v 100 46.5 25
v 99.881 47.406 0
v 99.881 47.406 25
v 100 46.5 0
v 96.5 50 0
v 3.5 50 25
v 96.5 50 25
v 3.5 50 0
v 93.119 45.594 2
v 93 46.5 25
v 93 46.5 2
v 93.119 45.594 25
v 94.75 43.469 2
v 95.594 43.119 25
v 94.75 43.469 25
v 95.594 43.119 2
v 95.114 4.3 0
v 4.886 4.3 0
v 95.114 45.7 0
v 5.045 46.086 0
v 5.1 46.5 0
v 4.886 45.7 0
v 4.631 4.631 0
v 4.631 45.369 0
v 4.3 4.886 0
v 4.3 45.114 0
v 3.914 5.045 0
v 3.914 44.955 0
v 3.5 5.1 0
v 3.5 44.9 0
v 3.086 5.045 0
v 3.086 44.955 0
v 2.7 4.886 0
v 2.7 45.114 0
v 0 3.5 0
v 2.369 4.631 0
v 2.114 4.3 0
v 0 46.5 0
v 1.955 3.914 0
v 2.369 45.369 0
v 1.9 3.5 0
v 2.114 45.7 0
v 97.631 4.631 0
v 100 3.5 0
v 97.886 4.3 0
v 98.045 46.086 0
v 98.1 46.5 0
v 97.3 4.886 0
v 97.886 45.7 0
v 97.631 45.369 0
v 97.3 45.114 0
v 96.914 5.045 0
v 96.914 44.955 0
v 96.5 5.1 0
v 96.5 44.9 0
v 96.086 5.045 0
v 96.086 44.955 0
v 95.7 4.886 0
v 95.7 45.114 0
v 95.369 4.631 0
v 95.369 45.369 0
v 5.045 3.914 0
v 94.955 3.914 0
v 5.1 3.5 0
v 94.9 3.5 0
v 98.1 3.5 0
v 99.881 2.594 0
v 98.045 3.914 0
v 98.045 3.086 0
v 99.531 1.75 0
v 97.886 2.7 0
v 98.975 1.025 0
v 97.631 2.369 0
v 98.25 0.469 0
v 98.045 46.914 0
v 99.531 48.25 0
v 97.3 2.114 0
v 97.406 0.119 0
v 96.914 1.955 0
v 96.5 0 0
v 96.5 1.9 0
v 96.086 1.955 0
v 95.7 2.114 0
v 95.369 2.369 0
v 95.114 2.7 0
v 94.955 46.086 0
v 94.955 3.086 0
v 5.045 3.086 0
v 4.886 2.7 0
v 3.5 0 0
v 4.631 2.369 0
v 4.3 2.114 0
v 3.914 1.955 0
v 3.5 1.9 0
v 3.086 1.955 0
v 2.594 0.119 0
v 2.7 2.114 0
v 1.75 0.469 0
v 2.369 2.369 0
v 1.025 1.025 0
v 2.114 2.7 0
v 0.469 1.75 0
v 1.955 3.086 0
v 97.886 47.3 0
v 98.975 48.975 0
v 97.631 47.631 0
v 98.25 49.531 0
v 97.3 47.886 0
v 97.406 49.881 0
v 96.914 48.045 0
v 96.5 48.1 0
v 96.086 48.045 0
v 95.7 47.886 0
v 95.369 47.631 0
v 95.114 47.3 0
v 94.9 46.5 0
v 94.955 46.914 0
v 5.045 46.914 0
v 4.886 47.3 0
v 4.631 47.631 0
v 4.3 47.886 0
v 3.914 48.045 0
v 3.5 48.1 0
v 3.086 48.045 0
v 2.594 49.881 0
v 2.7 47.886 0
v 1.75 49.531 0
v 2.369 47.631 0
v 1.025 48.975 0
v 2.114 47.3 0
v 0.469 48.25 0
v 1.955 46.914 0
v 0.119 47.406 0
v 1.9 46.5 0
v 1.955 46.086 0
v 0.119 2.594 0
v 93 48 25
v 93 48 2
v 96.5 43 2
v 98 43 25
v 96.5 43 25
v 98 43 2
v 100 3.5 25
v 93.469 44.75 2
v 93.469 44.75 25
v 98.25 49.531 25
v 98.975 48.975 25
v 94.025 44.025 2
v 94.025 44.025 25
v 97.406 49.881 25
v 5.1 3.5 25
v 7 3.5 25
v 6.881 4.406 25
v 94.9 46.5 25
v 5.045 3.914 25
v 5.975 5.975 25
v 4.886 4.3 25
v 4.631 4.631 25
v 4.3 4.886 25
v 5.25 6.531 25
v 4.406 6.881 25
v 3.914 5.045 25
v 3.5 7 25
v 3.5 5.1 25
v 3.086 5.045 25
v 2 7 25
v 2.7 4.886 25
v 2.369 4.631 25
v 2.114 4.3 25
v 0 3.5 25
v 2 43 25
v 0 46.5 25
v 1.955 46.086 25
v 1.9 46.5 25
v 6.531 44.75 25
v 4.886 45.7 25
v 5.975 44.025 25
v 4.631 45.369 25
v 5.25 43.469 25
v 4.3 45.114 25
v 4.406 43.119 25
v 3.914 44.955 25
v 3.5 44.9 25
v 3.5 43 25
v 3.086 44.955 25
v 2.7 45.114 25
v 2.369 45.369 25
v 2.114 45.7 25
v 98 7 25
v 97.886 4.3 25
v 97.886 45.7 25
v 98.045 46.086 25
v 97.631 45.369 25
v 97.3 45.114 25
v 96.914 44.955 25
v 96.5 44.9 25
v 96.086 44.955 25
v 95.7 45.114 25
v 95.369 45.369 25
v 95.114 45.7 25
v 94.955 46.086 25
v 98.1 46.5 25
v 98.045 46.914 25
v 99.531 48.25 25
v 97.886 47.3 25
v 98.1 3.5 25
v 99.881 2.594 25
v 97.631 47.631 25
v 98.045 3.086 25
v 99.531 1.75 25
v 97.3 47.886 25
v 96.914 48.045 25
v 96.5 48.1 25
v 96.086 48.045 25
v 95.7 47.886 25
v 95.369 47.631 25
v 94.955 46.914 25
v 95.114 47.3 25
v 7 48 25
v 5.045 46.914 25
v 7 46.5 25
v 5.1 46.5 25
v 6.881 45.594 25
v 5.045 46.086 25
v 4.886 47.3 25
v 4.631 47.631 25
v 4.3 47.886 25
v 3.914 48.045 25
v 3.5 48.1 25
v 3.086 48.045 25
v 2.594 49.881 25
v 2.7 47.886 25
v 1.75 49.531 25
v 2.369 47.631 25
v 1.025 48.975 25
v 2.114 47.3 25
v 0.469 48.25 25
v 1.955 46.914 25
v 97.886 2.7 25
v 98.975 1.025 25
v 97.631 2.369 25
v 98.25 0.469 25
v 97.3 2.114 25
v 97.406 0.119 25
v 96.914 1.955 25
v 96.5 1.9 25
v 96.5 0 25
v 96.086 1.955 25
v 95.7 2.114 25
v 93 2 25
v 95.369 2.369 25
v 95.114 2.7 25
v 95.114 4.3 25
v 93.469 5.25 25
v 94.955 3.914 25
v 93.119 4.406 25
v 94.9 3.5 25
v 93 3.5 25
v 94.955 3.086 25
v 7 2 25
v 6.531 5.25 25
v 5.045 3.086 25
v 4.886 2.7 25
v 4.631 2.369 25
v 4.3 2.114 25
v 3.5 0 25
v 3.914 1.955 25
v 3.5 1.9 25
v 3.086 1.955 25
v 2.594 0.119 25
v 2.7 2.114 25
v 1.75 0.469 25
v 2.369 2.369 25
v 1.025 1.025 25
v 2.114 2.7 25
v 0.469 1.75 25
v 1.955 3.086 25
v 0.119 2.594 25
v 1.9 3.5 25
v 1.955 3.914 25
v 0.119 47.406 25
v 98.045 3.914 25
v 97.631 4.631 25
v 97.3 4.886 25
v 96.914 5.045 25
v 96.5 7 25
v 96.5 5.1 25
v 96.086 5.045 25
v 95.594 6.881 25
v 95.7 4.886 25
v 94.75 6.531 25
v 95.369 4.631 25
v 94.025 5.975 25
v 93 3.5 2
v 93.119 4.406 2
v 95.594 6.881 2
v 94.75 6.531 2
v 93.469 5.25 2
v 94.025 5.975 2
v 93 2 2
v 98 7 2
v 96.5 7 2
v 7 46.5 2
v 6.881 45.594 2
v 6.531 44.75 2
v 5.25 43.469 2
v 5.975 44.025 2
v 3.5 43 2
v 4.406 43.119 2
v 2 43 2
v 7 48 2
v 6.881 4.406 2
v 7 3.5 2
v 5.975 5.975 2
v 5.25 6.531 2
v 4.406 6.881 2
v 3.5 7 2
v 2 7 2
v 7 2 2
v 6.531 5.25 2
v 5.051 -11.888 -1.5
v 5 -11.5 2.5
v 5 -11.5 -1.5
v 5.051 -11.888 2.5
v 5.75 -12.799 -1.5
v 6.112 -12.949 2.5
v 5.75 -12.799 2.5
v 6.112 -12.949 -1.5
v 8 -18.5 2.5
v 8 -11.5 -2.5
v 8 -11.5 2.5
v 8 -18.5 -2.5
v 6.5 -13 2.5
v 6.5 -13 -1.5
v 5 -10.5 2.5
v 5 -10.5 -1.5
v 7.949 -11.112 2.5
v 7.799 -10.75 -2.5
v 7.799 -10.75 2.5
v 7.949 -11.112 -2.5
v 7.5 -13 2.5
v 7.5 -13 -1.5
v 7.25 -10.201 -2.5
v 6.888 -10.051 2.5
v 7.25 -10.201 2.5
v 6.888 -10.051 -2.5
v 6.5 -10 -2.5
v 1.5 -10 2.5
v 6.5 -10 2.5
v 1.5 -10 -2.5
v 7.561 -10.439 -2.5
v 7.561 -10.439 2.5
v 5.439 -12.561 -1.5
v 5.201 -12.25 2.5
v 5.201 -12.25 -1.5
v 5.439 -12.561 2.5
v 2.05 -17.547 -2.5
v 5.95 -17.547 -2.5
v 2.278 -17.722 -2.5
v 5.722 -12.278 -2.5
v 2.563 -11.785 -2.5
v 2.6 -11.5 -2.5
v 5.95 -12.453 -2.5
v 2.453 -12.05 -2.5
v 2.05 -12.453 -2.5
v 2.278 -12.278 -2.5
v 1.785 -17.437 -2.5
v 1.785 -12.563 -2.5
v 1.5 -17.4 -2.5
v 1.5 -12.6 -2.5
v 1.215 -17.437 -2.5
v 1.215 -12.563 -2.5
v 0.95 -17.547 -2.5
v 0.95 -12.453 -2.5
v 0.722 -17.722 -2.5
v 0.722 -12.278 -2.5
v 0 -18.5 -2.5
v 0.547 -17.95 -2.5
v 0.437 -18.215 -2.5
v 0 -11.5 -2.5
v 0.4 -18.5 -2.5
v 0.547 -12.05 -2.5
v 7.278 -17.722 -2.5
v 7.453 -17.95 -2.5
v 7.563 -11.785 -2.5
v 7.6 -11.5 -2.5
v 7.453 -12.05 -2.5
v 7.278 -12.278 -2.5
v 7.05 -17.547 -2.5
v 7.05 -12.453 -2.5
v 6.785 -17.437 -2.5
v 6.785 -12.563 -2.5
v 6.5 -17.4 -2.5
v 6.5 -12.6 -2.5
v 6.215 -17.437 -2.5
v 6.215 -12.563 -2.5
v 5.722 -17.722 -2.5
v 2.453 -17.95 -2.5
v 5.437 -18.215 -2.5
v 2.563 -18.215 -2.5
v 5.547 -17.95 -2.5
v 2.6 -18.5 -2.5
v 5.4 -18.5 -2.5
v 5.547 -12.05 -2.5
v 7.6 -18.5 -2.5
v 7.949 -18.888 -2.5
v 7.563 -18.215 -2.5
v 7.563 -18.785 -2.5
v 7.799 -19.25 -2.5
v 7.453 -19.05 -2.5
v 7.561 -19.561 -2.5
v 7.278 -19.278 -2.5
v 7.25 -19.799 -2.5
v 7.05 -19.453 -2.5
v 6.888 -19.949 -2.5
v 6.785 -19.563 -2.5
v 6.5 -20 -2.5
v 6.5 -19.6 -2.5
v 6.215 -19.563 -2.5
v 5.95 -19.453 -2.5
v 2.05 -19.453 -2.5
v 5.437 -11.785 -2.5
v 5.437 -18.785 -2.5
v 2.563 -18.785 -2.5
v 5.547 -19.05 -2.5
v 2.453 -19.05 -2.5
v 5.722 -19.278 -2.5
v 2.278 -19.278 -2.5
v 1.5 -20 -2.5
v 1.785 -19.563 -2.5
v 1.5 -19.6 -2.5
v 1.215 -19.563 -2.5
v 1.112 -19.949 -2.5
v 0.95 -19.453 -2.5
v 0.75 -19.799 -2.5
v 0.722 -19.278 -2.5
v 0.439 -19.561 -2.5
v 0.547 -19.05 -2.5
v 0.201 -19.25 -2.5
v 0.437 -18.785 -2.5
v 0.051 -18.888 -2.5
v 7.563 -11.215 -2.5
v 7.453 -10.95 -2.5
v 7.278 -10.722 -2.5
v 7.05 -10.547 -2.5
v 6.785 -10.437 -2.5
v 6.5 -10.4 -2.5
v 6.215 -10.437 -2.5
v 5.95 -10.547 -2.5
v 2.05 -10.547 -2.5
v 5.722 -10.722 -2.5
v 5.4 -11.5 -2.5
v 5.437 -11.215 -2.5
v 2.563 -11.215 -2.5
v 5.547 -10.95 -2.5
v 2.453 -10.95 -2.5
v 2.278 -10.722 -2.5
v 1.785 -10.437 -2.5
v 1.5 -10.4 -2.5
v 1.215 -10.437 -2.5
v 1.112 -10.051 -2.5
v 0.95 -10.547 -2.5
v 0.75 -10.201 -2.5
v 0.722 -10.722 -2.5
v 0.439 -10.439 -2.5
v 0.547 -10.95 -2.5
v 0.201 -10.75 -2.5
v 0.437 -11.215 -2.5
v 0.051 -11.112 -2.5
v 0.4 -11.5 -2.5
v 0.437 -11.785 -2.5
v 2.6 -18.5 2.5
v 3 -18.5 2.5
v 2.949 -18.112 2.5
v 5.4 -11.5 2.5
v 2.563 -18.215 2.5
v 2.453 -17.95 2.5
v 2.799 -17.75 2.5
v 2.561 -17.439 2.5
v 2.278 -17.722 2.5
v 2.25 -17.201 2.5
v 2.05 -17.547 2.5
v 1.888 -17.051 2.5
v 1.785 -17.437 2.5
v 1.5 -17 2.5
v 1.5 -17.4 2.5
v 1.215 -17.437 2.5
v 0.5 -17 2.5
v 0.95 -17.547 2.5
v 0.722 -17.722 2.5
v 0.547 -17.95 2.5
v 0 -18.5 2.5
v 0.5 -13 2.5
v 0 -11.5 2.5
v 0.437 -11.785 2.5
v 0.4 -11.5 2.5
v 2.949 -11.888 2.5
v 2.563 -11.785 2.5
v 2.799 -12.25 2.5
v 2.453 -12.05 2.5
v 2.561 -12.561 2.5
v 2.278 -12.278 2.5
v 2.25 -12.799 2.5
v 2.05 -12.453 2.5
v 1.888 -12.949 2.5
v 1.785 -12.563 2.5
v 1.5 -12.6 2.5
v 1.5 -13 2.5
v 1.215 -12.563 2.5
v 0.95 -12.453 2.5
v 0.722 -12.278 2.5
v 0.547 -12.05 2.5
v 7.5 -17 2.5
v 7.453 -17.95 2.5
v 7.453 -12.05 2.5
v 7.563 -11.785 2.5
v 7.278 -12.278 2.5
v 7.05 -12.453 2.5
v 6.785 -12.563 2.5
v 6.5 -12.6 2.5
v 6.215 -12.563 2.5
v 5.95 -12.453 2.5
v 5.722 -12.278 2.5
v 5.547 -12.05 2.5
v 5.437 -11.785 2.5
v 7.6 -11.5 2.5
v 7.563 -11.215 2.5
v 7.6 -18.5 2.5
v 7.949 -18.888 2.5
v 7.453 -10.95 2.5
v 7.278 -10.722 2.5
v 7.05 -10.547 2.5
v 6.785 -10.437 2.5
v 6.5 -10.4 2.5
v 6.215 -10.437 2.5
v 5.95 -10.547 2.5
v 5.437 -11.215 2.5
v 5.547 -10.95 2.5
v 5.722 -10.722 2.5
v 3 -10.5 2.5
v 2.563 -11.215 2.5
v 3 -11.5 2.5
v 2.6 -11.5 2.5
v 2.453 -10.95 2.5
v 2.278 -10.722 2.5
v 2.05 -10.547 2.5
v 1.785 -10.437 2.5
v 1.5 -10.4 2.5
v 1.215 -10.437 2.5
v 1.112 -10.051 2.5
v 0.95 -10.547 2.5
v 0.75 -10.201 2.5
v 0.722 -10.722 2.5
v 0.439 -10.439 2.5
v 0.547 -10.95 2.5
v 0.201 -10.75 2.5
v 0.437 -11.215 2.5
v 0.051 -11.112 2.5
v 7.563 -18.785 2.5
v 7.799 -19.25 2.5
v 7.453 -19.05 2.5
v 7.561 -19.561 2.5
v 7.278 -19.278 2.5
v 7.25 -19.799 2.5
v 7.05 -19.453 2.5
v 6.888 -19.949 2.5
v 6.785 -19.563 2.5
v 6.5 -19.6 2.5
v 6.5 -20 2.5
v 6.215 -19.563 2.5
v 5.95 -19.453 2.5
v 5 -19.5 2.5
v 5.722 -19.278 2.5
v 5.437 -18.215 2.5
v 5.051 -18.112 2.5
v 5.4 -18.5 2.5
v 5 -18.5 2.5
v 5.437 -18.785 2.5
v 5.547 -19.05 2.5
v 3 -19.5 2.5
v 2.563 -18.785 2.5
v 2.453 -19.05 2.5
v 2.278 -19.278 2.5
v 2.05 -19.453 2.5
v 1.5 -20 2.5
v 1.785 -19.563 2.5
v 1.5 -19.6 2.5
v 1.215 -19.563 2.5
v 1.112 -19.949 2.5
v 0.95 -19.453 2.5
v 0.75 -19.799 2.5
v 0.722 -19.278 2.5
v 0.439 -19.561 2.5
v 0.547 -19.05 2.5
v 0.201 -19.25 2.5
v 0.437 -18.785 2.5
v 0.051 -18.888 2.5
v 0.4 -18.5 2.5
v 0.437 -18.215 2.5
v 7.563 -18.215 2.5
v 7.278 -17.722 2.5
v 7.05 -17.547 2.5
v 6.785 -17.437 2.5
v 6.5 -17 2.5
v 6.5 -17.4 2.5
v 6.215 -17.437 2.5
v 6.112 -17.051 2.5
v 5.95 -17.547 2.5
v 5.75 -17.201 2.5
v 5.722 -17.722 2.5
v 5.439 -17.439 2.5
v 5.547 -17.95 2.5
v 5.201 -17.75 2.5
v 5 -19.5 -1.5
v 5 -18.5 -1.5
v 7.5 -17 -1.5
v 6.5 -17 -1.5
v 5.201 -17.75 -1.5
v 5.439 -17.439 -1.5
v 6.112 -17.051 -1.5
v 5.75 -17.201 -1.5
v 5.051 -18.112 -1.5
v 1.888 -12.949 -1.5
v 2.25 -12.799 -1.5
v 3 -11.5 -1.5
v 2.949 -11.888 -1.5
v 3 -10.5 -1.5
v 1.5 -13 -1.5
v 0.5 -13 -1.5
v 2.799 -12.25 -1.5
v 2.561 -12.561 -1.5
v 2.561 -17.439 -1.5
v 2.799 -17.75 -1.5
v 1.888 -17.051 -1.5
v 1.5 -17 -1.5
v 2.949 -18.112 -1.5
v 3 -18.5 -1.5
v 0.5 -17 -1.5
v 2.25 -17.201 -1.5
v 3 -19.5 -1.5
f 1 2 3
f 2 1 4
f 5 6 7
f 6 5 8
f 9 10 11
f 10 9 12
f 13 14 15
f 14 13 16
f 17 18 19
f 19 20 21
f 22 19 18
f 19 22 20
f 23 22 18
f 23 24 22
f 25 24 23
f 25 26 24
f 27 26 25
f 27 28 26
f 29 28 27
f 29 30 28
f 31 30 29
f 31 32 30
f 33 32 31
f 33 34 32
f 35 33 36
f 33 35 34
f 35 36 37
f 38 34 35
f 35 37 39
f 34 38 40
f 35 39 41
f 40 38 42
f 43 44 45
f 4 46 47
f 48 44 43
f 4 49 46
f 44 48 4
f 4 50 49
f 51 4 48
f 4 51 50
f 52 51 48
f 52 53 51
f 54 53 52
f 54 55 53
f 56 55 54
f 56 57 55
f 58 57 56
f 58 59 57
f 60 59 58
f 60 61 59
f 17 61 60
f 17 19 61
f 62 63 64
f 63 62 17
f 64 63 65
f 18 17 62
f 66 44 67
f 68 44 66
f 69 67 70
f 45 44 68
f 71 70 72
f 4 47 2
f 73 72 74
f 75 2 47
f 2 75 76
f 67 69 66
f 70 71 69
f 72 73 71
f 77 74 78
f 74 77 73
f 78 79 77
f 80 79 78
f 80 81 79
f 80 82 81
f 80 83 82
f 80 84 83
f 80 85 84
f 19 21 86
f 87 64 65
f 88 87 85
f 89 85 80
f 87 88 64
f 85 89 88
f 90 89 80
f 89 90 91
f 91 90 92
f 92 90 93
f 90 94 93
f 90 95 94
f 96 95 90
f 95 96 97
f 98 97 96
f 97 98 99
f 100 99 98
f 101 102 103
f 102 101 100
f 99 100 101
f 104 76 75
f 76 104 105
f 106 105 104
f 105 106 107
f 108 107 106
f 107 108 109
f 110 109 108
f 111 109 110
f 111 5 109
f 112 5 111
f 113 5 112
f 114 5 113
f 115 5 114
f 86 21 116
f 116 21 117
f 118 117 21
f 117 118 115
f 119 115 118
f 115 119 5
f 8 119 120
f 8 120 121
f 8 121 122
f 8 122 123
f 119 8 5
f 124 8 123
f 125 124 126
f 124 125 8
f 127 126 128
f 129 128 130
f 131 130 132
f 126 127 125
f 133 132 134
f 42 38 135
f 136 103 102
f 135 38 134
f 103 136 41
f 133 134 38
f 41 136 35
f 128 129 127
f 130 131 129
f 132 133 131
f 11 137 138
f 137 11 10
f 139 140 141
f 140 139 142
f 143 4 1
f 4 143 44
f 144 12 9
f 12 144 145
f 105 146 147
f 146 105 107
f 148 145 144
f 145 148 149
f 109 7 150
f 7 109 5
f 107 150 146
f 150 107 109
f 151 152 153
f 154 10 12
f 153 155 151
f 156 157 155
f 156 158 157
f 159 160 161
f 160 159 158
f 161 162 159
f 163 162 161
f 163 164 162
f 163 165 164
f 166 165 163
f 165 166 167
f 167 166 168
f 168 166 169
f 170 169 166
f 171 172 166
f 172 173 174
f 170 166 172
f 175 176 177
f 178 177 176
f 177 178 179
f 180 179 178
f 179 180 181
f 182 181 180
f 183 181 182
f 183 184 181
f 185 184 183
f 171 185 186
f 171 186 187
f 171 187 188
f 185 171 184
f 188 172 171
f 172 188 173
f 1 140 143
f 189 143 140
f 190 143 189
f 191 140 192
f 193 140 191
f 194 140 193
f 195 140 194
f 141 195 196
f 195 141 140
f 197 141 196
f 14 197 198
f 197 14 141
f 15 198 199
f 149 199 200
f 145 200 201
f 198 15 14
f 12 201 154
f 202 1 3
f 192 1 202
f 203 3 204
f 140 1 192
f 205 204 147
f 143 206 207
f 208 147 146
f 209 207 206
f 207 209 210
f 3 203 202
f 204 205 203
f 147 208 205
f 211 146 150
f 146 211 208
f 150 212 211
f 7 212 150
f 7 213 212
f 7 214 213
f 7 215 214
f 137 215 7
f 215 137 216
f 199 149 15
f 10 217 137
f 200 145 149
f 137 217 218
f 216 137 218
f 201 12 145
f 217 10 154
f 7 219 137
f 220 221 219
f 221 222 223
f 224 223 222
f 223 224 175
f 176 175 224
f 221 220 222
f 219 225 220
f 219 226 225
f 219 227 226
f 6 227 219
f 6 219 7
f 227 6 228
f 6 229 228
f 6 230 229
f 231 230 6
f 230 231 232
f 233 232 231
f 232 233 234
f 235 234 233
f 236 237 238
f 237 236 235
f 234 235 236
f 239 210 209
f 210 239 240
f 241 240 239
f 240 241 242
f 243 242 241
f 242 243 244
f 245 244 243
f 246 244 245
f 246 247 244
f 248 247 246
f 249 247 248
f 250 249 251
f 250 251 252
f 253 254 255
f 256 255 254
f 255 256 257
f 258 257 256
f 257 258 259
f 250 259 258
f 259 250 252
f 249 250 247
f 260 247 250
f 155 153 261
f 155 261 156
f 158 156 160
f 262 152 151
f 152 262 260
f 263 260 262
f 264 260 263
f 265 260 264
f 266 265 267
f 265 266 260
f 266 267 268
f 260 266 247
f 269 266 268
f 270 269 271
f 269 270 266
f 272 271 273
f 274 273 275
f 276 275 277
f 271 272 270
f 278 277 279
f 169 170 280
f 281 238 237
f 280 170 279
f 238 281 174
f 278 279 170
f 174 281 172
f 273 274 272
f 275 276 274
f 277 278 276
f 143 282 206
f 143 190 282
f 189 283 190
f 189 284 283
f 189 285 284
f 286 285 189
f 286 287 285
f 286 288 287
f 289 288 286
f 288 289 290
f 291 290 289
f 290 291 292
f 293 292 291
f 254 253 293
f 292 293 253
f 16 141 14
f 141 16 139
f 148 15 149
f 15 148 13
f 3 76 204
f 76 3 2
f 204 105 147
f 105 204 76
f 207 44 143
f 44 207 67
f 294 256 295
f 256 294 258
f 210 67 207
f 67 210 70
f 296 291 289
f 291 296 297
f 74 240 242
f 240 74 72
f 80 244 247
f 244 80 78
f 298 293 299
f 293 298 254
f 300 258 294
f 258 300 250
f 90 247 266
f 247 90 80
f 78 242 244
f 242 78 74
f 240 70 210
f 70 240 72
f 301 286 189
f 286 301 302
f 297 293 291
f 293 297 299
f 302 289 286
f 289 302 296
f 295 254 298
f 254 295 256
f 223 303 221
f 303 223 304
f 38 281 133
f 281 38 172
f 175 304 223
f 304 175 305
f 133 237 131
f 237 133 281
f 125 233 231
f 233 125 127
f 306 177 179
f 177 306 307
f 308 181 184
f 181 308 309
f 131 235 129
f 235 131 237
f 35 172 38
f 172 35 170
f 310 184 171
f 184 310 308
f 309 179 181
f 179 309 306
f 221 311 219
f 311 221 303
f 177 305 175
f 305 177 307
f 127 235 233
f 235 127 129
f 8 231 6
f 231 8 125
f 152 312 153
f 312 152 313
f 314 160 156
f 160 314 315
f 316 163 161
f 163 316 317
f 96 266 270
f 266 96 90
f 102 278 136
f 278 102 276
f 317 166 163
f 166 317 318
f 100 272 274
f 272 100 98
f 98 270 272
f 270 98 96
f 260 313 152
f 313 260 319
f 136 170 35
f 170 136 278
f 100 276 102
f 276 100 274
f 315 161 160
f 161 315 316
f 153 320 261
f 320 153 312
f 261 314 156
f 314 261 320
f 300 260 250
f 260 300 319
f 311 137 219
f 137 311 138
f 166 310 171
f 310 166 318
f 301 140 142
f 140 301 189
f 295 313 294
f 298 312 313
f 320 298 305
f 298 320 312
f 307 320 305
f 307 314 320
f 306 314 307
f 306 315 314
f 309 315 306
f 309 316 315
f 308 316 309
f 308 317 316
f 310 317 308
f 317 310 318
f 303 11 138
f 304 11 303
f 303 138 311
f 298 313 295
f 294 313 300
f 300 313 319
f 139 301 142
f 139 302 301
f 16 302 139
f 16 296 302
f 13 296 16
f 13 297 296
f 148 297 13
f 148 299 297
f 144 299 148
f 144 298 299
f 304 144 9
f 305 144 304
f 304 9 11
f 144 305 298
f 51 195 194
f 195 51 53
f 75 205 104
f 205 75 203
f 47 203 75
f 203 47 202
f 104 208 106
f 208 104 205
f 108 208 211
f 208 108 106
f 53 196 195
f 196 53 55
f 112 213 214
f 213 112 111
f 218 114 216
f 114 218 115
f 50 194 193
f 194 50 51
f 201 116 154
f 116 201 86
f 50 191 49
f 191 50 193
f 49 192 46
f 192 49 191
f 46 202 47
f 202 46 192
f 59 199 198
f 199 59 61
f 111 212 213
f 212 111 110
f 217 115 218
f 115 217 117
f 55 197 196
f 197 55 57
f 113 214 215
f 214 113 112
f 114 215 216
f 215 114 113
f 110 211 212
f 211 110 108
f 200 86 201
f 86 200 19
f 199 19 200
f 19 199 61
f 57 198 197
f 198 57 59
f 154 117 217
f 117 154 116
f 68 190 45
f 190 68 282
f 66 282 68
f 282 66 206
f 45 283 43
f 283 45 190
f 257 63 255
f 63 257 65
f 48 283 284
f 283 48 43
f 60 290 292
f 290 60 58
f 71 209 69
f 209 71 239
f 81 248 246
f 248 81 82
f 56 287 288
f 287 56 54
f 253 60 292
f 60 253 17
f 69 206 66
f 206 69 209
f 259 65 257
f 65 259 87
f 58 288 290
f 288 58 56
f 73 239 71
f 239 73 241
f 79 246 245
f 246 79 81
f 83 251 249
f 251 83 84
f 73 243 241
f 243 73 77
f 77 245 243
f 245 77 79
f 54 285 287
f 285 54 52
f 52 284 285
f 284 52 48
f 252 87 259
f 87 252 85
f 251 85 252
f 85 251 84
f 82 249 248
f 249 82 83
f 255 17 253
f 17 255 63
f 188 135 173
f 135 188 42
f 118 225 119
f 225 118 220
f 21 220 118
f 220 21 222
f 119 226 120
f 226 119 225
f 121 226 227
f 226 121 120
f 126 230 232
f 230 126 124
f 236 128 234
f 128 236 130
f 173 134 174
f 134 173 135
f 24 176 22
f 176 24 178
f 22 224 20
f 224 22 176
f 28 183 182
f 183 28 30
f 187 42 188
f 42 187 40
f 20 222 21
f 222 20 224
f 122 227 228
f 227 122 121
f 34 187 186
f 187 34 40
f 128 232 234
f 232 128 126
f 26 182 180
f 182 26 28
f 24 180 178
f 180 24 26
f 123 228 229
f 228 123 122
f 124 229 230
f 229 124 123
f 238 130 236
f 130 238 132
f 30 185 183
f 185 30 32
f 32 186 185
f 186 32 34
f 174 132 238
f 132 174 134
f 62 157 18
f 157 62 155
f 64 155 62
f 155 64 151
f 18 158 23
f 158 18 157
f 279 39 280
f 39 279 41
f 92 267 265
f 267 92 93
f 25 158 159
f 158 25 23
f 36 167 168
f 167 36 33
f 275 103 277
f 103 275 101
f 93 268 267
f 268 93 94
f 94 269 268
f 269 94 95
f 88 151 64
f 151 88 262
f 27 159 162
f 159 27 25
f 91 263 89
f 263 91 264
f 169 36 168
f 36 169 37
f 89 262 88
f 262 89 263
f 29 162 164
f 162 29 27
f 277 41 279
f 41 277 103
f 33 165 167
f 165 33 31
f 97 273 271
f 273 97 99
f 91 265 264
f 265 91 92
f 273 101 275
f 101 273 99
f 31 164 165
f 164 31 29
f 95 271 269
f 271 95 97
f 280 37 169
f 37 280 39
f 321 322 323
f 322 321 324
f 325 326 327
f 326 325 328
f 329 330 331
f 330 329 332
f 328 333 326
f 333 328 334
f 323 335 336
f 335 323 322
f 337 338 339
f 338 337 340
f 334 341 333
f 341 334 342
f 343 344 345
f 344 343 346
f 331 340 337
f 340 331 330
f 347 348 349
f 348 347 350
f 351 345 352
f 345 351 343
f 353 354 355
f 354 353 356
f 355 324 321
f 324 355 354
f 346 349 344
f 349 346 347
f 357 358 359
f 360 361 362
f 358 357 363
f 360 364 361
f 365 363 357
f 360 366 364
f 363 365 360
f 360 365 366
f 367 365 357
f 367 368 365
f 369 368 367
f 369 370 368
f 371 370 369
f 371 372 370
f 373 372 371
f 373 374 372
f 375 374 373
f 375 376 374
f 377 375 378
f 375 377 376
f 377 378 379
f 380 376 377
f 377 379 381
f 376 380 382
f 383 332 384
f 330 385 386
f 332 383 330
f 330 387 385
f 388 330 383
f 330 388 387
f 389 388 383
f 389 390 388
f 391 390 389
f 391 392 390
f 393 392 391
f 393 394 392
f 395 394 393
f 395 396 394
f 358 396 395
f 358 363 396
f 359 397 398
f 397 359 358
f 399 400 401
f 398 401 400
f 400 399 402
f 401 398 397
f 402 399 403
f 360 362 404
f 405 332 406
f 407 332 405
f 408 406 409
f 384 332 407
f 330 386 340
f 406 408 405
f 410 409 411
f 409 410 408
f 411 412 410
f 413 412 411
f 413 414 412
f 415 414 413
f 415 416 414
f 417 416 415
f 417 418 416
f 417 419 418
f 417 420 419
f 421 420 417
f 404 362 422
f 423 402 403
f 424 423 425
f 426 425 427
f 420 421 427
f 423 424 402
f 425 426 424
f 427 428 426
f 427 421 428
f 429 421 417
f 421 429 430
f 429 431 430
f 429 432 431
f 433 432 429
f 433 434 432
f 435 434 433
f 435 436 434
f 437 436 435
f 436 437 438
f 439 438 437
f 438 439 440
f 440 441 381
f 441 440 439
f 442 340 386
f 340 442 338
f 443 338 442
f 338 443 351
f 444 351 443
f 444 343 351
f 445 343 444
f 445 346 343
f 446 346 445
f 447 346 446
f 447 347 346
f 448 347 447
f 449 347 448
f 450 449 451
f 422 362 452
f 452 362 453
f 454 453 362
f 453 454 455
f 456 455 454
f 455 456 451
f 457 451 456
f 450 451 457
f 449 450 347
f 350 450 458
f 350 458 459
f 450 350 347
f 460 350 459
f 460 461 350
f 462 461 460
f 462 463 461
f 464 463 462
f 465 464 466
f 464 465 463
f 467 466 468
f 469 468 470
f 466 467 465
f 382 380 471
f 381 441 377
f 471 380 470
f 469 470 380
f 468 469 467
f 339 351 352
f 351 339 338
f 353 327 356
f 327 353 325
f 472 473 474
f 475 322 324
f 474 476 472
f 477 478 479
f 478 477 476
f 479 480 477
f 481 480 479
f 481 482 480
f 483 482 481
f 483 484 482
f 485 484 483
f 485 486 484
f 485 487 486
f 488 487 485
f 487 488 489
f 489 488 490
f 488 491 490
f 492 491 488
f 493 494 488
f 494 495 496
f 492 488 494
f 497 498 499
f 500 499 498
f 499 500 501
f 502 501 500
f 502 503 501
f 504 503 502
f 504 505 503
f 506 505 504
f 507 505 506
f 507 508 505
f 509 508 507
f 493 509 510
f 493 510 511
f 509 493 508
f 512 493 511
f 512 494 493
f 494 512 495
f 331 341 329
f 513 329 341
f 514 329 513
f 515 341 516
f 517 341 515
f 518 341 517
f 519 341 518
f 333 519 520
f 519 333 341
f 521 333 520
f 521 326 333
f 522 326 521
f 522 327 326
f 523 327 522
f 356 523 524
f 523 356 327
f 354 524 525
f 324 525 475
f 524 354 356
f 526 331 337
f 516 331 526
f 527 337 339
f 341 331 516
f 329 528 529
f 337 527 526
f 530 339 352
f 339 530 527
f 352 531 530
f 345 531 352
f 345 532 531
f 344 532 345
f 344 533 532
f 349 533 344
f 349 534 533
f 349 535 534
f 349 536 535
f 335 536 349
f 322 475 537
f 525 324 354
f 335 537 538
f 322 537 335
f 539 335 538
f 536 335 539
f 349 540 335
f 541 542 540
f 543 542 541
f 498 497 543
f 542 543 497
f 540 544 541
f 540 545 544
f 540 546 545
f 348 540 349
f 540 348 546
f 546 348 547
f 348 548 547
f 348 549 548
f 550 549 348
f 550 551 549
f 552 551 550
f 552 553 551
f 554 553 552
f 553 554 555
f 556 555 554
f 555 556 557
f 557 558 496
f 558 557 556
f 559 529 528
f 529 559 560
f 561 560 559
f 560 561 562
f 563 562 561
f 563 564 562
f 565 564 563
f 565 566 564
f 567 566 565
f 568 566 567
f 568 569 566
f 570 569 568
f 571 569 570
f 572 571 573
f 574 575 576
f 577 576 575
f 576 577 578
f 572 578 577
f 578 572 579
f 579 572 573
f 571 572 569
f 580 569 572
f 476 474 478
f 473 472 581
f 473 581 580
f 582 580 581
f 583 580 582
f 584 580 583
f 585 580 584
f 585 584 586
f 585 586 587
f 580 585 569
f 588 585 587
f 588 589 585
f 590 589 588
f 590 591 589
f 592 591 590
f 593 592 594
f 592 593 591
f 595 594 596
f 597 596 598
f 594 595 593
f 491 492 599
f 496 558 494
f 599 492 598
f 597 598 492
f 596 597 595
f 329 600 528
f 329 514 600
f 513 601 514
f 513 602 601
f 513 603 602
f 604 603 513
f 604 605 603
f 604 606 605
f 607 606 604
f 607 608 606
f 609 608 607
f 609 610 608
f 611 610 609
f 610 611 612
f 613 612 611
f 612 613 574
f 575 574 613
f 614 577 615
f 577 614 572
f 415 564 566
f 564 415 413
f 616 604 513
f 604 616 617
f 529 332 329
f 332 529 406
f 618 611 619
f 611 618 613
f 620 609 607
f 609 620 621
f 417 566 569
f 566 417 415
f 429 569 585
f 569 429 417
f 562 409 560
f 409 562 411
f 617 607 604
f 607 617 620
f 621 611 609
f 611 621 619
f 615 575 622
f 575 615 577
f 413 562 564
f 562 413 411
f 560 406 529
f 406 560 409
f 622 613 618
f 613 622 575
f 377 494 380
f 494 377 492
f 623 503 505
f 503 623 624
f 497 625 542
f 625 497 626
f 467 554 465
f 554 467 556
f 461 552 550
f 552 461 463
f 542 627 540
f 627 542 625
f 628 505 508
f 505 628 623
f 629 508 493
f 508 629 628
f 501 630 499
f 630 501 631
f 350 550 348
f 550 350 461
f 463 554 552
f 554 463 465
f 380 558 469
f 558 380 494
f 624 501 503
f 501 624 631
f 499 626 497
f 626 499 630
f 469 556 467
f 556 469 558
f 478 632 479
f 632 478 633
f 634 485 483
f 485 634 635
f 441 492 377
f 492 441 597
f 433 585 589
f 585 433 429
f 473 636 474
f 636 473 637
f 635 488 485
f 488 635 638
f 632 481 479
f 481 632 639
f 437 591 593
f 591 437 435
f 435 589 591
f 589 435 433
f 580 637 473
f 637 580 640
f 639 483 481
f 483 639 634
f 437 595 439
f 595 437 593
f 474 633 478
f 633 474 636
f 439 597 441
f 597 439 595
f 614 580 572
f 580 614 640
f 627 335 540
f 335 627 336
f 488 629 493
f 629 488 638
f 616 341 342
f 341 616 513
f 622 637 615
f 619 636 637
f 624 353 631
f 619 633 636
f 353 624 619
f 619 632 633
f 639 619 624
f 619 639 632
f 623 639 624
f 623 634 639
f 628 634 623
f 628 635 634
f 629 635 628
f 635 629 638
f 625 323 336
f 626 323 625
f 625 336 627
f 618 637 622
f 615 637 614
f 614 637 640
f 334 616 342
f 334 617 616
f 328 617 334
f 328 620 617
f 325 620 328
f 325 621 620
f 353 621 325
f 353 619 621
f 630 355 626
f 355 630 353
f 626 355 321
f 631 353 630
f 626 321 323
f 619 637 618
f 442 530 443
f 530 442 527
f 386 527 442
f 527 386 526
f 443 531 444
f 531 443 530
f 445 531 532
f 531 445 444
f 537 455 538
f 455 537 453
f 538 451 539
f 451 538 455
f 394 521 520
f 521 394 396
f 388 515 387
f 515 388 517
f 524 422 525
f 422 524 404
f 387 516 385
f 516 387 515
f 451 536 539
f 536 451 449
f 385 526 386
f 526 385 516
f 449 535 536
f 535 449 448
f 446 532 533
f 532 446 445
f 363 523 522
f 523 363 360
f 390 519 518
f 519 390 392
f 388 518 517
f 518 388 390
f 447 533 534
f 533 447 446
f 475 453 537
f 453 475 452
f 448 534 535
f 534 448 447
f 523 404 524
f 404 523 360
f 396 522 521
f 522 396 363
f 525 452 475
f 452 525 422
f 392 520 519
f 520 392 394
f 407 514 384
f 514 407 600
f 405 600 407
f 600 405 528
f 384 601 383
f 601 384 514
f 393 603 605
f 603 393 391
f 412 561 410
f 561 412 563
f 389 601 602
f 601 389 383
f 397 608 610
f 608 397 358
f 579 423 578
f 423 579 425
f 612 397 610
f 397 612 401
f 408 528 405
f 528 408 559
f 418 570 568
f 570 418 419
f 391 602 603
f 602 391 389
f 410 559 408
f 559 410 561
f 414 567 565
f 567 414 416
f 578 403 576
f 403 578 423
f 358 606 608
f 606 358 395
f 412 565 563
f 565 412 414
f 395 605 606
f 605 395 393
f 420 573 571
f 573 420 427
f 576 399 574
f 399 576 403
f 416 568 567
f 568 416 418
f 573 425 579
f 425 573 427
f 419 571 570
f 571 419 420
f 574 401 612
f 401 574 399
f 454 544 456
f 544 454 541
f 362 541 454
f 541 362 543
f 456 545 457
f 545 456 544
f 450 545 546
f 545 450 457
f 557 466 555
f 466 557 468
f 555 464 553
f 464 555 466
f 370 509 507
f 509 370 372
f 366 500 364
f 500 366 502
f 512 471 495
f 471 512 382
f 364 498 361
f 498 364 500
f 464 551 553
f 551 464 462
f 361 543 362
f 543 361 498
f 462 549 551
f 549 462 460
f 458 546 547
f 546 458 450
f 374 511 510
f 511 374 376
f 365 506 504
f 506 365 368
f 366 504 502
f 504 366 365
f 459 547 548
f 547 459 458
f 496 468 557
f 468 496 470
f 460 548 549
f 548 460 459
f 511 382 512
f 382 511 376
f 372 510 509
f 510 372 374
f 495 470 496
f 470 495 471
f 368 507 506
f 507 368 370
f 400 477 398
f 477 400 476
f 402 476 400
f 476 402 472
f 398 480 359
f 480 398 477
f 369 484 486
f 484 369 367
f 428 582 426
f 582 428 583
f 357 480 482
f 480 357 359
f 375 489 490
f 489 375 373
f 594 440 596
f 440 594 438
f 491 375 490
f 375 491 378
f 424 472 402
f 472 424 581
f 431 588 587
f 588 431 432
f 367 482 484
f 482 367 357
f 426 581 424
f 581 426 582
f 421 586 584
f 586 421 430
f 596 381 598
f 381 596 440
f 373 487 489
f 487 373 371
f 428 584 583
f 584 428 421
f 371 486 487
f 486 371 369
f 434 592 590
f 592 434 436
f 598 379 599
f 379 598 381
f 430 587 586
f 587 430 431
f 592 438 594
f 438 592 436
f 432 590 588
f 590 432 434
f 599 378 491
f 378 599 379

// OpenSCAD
// file: cube_vround.scad
module cube_vround(
	size=[10,10,10],
	round_corners=[true,true,true,true],
	rounding=3,
	center_xy=false,
	center_z=false,
	attach=0,
	wall_attach=0,
	quality=2, //integer from 1 to infinity
)
{
	assert(len(size)==3);
	assert(len(round_corners)==4);
	assert(rounding>0);
	assert(rounding<=size[0]/2);
	assert(rounding<=size[1]/2);
	assert(quality>0);
	assert(attach>=0);
	assert(wall_attach>=0);
	height=size[2]+attach;
	cyl_r=rounding+wall_attach;
	cyl_mvx=size[0]/2-rounding;
	cyl_mvy=size[1]/2-rounding;
	cube_szx=size[0]/2;
	cube_szy=size[1]/2;
	cube_mvx=cube_szx/2+wall_attach;
	cube_mvy=cube_szy/2+wall_attach;
	translate([center_xy?0:cube_szx,center_xy?0:cube_szy,center_z?-attach/2:(size[2]-attach)/2])
		hull()
		{
			if(round_corners[0])
				translate([cyl_mvx,cyl_mvy])
					cylinder(r=cyl_r,h=height,$fn=12*quality,center=true);
			else
				translate([cube_mvx,cube_mvy])
					cube([cube_szx,cube_szy,height],center=true);
			if(round_corners[1])
				translate([cyl_mvx,-cyl_mvy])
					cylinder(r=cyl_r,h=height,$fn=12*quality,center=true);
			else
				translate([cube_mvx,-cube_mvy])
					cube([cube_szx,cube_szy,height],center=true);
			if(round_corners[2])
				translate([-cyl_mvx,-cyl_mvy])
					cylinder(r=cyl_r,h=height,$fn=12*quality,center=true);
			else
				translate([-cube_mvx,-cube_mvy])
					cube([cube_szx,cube_szy,height],center=true);
			if(round_corners[3])
				translate([-cyl_mvx,cyl_mvy])
					cylinder(r=cyl_r,h=height,$fn=12*quality,center=true);
			else
				translate([-cube_mvx,cube_mvy])
					cube([cube_szx,cube_szy,height],center=true);
		};
}

//example
cube_vround(round_corners=[true,false,true,false],
size=[10,20,6],
attach=0.1,
wall_attach=0.1,
rounding=3,
center_xy=true,center_z=false);
// main file
use <cube_vround.scad>

module case_section(
size=[100,50,25],
screw_diam=3,
screw_clearance=0.2,
wall_sz=2,
base_sz=2,
center_xy=false,
center_z=false,
attach=0,
quality=2,
vents=[true,true,true,true],
vent_size=[3,2],
vent_period=[5,4],
vent_angle=0,
)
{
	assert(len(vents)==4);
	assert(len(vent_size)==2);
	assert(len(vent_period)==2);
	assert(vent_angle==0);
	assert(len(size)==3);
	size_x=size[0];
	size_y=size[1];
	height=size[2];
	assert(screw_diam>1);
	assert(screw_clearance>=0);
	assert(screw_clearance<0.5);
	assert(wall_sz>0);
	assert(base_sz>0);
	assert(height>base_sz);
	assert(quality>0);
	assert(attach>=0);
	min_sz=4*wall_sz+2*screw_diam;
	assert(size_x>=min_sz);
	assert(size_y>=min_sz);

	cstand_width=2*wall_sz+screw_diam;
	cstand_mvx=(size_x-cstand_width)/2;
	cstand_mvy=(size_y-cstand_width)/2;

	translate([center_xy?0:size_x/2,center_xy?0:size_y/2,center_z?-height/2:0])
	{
		difference()
		{
			union()
			{
				//corner stands base
				for(i=[true,false],j=[true,false])
					translate([(i?1:-1)*cstand_mvx,(j?1:-1)*cstand_mvy])
						cube_vround(round_corners=[(i==j?true:false),(i==j?false:true),(i==j?true:false),(i==j?false:true)],
							size=[cstand_width,cstand_width,height],
							rounding=screw_diam/2+wall_sz,
							attach=attach,wall_attach=0,quality=quality,center_xy=true,center_z=false);
				//walls
				for(i=[-1,1])
					translate([0,i*(size_y-wall_sz)/2,(height-attach)/2])
						cube([size_x-cstand_width,wall_sz,height+attach],center=true);
				for(i=[-1,1])
					translate([i*(size_x-wall_sz)/2,0,(height-attach)/2])
						cube([wall_sz,size_y-cstand_width,height+attach],center=true);
				//bottom
				cube_vround(size=[size_x-wall_sz,size_y-wall_sz,base_sz],
					rounding=(screw_diam+wall_sz)/2,
					attach=attach,center_xy=true);
			}
			//corner stands screws
			for(i=[true,false],j=[true,false])
				translate([(i?1:-1)*cstand_mvx,(j?1:-1)*cstand_mvy,-attach-0.1])
					cylinder(d=screw_diam+screw_clearance,h=height+attach+0.2,$fn=12*quality);
			//vents
		}
	}
}

//examples
case_section();

translate([0,-20,0])
	case_section(size=[8,10,5],wall_sz=0.5,screw_diam=2,base_sz=1,center_z=true);
